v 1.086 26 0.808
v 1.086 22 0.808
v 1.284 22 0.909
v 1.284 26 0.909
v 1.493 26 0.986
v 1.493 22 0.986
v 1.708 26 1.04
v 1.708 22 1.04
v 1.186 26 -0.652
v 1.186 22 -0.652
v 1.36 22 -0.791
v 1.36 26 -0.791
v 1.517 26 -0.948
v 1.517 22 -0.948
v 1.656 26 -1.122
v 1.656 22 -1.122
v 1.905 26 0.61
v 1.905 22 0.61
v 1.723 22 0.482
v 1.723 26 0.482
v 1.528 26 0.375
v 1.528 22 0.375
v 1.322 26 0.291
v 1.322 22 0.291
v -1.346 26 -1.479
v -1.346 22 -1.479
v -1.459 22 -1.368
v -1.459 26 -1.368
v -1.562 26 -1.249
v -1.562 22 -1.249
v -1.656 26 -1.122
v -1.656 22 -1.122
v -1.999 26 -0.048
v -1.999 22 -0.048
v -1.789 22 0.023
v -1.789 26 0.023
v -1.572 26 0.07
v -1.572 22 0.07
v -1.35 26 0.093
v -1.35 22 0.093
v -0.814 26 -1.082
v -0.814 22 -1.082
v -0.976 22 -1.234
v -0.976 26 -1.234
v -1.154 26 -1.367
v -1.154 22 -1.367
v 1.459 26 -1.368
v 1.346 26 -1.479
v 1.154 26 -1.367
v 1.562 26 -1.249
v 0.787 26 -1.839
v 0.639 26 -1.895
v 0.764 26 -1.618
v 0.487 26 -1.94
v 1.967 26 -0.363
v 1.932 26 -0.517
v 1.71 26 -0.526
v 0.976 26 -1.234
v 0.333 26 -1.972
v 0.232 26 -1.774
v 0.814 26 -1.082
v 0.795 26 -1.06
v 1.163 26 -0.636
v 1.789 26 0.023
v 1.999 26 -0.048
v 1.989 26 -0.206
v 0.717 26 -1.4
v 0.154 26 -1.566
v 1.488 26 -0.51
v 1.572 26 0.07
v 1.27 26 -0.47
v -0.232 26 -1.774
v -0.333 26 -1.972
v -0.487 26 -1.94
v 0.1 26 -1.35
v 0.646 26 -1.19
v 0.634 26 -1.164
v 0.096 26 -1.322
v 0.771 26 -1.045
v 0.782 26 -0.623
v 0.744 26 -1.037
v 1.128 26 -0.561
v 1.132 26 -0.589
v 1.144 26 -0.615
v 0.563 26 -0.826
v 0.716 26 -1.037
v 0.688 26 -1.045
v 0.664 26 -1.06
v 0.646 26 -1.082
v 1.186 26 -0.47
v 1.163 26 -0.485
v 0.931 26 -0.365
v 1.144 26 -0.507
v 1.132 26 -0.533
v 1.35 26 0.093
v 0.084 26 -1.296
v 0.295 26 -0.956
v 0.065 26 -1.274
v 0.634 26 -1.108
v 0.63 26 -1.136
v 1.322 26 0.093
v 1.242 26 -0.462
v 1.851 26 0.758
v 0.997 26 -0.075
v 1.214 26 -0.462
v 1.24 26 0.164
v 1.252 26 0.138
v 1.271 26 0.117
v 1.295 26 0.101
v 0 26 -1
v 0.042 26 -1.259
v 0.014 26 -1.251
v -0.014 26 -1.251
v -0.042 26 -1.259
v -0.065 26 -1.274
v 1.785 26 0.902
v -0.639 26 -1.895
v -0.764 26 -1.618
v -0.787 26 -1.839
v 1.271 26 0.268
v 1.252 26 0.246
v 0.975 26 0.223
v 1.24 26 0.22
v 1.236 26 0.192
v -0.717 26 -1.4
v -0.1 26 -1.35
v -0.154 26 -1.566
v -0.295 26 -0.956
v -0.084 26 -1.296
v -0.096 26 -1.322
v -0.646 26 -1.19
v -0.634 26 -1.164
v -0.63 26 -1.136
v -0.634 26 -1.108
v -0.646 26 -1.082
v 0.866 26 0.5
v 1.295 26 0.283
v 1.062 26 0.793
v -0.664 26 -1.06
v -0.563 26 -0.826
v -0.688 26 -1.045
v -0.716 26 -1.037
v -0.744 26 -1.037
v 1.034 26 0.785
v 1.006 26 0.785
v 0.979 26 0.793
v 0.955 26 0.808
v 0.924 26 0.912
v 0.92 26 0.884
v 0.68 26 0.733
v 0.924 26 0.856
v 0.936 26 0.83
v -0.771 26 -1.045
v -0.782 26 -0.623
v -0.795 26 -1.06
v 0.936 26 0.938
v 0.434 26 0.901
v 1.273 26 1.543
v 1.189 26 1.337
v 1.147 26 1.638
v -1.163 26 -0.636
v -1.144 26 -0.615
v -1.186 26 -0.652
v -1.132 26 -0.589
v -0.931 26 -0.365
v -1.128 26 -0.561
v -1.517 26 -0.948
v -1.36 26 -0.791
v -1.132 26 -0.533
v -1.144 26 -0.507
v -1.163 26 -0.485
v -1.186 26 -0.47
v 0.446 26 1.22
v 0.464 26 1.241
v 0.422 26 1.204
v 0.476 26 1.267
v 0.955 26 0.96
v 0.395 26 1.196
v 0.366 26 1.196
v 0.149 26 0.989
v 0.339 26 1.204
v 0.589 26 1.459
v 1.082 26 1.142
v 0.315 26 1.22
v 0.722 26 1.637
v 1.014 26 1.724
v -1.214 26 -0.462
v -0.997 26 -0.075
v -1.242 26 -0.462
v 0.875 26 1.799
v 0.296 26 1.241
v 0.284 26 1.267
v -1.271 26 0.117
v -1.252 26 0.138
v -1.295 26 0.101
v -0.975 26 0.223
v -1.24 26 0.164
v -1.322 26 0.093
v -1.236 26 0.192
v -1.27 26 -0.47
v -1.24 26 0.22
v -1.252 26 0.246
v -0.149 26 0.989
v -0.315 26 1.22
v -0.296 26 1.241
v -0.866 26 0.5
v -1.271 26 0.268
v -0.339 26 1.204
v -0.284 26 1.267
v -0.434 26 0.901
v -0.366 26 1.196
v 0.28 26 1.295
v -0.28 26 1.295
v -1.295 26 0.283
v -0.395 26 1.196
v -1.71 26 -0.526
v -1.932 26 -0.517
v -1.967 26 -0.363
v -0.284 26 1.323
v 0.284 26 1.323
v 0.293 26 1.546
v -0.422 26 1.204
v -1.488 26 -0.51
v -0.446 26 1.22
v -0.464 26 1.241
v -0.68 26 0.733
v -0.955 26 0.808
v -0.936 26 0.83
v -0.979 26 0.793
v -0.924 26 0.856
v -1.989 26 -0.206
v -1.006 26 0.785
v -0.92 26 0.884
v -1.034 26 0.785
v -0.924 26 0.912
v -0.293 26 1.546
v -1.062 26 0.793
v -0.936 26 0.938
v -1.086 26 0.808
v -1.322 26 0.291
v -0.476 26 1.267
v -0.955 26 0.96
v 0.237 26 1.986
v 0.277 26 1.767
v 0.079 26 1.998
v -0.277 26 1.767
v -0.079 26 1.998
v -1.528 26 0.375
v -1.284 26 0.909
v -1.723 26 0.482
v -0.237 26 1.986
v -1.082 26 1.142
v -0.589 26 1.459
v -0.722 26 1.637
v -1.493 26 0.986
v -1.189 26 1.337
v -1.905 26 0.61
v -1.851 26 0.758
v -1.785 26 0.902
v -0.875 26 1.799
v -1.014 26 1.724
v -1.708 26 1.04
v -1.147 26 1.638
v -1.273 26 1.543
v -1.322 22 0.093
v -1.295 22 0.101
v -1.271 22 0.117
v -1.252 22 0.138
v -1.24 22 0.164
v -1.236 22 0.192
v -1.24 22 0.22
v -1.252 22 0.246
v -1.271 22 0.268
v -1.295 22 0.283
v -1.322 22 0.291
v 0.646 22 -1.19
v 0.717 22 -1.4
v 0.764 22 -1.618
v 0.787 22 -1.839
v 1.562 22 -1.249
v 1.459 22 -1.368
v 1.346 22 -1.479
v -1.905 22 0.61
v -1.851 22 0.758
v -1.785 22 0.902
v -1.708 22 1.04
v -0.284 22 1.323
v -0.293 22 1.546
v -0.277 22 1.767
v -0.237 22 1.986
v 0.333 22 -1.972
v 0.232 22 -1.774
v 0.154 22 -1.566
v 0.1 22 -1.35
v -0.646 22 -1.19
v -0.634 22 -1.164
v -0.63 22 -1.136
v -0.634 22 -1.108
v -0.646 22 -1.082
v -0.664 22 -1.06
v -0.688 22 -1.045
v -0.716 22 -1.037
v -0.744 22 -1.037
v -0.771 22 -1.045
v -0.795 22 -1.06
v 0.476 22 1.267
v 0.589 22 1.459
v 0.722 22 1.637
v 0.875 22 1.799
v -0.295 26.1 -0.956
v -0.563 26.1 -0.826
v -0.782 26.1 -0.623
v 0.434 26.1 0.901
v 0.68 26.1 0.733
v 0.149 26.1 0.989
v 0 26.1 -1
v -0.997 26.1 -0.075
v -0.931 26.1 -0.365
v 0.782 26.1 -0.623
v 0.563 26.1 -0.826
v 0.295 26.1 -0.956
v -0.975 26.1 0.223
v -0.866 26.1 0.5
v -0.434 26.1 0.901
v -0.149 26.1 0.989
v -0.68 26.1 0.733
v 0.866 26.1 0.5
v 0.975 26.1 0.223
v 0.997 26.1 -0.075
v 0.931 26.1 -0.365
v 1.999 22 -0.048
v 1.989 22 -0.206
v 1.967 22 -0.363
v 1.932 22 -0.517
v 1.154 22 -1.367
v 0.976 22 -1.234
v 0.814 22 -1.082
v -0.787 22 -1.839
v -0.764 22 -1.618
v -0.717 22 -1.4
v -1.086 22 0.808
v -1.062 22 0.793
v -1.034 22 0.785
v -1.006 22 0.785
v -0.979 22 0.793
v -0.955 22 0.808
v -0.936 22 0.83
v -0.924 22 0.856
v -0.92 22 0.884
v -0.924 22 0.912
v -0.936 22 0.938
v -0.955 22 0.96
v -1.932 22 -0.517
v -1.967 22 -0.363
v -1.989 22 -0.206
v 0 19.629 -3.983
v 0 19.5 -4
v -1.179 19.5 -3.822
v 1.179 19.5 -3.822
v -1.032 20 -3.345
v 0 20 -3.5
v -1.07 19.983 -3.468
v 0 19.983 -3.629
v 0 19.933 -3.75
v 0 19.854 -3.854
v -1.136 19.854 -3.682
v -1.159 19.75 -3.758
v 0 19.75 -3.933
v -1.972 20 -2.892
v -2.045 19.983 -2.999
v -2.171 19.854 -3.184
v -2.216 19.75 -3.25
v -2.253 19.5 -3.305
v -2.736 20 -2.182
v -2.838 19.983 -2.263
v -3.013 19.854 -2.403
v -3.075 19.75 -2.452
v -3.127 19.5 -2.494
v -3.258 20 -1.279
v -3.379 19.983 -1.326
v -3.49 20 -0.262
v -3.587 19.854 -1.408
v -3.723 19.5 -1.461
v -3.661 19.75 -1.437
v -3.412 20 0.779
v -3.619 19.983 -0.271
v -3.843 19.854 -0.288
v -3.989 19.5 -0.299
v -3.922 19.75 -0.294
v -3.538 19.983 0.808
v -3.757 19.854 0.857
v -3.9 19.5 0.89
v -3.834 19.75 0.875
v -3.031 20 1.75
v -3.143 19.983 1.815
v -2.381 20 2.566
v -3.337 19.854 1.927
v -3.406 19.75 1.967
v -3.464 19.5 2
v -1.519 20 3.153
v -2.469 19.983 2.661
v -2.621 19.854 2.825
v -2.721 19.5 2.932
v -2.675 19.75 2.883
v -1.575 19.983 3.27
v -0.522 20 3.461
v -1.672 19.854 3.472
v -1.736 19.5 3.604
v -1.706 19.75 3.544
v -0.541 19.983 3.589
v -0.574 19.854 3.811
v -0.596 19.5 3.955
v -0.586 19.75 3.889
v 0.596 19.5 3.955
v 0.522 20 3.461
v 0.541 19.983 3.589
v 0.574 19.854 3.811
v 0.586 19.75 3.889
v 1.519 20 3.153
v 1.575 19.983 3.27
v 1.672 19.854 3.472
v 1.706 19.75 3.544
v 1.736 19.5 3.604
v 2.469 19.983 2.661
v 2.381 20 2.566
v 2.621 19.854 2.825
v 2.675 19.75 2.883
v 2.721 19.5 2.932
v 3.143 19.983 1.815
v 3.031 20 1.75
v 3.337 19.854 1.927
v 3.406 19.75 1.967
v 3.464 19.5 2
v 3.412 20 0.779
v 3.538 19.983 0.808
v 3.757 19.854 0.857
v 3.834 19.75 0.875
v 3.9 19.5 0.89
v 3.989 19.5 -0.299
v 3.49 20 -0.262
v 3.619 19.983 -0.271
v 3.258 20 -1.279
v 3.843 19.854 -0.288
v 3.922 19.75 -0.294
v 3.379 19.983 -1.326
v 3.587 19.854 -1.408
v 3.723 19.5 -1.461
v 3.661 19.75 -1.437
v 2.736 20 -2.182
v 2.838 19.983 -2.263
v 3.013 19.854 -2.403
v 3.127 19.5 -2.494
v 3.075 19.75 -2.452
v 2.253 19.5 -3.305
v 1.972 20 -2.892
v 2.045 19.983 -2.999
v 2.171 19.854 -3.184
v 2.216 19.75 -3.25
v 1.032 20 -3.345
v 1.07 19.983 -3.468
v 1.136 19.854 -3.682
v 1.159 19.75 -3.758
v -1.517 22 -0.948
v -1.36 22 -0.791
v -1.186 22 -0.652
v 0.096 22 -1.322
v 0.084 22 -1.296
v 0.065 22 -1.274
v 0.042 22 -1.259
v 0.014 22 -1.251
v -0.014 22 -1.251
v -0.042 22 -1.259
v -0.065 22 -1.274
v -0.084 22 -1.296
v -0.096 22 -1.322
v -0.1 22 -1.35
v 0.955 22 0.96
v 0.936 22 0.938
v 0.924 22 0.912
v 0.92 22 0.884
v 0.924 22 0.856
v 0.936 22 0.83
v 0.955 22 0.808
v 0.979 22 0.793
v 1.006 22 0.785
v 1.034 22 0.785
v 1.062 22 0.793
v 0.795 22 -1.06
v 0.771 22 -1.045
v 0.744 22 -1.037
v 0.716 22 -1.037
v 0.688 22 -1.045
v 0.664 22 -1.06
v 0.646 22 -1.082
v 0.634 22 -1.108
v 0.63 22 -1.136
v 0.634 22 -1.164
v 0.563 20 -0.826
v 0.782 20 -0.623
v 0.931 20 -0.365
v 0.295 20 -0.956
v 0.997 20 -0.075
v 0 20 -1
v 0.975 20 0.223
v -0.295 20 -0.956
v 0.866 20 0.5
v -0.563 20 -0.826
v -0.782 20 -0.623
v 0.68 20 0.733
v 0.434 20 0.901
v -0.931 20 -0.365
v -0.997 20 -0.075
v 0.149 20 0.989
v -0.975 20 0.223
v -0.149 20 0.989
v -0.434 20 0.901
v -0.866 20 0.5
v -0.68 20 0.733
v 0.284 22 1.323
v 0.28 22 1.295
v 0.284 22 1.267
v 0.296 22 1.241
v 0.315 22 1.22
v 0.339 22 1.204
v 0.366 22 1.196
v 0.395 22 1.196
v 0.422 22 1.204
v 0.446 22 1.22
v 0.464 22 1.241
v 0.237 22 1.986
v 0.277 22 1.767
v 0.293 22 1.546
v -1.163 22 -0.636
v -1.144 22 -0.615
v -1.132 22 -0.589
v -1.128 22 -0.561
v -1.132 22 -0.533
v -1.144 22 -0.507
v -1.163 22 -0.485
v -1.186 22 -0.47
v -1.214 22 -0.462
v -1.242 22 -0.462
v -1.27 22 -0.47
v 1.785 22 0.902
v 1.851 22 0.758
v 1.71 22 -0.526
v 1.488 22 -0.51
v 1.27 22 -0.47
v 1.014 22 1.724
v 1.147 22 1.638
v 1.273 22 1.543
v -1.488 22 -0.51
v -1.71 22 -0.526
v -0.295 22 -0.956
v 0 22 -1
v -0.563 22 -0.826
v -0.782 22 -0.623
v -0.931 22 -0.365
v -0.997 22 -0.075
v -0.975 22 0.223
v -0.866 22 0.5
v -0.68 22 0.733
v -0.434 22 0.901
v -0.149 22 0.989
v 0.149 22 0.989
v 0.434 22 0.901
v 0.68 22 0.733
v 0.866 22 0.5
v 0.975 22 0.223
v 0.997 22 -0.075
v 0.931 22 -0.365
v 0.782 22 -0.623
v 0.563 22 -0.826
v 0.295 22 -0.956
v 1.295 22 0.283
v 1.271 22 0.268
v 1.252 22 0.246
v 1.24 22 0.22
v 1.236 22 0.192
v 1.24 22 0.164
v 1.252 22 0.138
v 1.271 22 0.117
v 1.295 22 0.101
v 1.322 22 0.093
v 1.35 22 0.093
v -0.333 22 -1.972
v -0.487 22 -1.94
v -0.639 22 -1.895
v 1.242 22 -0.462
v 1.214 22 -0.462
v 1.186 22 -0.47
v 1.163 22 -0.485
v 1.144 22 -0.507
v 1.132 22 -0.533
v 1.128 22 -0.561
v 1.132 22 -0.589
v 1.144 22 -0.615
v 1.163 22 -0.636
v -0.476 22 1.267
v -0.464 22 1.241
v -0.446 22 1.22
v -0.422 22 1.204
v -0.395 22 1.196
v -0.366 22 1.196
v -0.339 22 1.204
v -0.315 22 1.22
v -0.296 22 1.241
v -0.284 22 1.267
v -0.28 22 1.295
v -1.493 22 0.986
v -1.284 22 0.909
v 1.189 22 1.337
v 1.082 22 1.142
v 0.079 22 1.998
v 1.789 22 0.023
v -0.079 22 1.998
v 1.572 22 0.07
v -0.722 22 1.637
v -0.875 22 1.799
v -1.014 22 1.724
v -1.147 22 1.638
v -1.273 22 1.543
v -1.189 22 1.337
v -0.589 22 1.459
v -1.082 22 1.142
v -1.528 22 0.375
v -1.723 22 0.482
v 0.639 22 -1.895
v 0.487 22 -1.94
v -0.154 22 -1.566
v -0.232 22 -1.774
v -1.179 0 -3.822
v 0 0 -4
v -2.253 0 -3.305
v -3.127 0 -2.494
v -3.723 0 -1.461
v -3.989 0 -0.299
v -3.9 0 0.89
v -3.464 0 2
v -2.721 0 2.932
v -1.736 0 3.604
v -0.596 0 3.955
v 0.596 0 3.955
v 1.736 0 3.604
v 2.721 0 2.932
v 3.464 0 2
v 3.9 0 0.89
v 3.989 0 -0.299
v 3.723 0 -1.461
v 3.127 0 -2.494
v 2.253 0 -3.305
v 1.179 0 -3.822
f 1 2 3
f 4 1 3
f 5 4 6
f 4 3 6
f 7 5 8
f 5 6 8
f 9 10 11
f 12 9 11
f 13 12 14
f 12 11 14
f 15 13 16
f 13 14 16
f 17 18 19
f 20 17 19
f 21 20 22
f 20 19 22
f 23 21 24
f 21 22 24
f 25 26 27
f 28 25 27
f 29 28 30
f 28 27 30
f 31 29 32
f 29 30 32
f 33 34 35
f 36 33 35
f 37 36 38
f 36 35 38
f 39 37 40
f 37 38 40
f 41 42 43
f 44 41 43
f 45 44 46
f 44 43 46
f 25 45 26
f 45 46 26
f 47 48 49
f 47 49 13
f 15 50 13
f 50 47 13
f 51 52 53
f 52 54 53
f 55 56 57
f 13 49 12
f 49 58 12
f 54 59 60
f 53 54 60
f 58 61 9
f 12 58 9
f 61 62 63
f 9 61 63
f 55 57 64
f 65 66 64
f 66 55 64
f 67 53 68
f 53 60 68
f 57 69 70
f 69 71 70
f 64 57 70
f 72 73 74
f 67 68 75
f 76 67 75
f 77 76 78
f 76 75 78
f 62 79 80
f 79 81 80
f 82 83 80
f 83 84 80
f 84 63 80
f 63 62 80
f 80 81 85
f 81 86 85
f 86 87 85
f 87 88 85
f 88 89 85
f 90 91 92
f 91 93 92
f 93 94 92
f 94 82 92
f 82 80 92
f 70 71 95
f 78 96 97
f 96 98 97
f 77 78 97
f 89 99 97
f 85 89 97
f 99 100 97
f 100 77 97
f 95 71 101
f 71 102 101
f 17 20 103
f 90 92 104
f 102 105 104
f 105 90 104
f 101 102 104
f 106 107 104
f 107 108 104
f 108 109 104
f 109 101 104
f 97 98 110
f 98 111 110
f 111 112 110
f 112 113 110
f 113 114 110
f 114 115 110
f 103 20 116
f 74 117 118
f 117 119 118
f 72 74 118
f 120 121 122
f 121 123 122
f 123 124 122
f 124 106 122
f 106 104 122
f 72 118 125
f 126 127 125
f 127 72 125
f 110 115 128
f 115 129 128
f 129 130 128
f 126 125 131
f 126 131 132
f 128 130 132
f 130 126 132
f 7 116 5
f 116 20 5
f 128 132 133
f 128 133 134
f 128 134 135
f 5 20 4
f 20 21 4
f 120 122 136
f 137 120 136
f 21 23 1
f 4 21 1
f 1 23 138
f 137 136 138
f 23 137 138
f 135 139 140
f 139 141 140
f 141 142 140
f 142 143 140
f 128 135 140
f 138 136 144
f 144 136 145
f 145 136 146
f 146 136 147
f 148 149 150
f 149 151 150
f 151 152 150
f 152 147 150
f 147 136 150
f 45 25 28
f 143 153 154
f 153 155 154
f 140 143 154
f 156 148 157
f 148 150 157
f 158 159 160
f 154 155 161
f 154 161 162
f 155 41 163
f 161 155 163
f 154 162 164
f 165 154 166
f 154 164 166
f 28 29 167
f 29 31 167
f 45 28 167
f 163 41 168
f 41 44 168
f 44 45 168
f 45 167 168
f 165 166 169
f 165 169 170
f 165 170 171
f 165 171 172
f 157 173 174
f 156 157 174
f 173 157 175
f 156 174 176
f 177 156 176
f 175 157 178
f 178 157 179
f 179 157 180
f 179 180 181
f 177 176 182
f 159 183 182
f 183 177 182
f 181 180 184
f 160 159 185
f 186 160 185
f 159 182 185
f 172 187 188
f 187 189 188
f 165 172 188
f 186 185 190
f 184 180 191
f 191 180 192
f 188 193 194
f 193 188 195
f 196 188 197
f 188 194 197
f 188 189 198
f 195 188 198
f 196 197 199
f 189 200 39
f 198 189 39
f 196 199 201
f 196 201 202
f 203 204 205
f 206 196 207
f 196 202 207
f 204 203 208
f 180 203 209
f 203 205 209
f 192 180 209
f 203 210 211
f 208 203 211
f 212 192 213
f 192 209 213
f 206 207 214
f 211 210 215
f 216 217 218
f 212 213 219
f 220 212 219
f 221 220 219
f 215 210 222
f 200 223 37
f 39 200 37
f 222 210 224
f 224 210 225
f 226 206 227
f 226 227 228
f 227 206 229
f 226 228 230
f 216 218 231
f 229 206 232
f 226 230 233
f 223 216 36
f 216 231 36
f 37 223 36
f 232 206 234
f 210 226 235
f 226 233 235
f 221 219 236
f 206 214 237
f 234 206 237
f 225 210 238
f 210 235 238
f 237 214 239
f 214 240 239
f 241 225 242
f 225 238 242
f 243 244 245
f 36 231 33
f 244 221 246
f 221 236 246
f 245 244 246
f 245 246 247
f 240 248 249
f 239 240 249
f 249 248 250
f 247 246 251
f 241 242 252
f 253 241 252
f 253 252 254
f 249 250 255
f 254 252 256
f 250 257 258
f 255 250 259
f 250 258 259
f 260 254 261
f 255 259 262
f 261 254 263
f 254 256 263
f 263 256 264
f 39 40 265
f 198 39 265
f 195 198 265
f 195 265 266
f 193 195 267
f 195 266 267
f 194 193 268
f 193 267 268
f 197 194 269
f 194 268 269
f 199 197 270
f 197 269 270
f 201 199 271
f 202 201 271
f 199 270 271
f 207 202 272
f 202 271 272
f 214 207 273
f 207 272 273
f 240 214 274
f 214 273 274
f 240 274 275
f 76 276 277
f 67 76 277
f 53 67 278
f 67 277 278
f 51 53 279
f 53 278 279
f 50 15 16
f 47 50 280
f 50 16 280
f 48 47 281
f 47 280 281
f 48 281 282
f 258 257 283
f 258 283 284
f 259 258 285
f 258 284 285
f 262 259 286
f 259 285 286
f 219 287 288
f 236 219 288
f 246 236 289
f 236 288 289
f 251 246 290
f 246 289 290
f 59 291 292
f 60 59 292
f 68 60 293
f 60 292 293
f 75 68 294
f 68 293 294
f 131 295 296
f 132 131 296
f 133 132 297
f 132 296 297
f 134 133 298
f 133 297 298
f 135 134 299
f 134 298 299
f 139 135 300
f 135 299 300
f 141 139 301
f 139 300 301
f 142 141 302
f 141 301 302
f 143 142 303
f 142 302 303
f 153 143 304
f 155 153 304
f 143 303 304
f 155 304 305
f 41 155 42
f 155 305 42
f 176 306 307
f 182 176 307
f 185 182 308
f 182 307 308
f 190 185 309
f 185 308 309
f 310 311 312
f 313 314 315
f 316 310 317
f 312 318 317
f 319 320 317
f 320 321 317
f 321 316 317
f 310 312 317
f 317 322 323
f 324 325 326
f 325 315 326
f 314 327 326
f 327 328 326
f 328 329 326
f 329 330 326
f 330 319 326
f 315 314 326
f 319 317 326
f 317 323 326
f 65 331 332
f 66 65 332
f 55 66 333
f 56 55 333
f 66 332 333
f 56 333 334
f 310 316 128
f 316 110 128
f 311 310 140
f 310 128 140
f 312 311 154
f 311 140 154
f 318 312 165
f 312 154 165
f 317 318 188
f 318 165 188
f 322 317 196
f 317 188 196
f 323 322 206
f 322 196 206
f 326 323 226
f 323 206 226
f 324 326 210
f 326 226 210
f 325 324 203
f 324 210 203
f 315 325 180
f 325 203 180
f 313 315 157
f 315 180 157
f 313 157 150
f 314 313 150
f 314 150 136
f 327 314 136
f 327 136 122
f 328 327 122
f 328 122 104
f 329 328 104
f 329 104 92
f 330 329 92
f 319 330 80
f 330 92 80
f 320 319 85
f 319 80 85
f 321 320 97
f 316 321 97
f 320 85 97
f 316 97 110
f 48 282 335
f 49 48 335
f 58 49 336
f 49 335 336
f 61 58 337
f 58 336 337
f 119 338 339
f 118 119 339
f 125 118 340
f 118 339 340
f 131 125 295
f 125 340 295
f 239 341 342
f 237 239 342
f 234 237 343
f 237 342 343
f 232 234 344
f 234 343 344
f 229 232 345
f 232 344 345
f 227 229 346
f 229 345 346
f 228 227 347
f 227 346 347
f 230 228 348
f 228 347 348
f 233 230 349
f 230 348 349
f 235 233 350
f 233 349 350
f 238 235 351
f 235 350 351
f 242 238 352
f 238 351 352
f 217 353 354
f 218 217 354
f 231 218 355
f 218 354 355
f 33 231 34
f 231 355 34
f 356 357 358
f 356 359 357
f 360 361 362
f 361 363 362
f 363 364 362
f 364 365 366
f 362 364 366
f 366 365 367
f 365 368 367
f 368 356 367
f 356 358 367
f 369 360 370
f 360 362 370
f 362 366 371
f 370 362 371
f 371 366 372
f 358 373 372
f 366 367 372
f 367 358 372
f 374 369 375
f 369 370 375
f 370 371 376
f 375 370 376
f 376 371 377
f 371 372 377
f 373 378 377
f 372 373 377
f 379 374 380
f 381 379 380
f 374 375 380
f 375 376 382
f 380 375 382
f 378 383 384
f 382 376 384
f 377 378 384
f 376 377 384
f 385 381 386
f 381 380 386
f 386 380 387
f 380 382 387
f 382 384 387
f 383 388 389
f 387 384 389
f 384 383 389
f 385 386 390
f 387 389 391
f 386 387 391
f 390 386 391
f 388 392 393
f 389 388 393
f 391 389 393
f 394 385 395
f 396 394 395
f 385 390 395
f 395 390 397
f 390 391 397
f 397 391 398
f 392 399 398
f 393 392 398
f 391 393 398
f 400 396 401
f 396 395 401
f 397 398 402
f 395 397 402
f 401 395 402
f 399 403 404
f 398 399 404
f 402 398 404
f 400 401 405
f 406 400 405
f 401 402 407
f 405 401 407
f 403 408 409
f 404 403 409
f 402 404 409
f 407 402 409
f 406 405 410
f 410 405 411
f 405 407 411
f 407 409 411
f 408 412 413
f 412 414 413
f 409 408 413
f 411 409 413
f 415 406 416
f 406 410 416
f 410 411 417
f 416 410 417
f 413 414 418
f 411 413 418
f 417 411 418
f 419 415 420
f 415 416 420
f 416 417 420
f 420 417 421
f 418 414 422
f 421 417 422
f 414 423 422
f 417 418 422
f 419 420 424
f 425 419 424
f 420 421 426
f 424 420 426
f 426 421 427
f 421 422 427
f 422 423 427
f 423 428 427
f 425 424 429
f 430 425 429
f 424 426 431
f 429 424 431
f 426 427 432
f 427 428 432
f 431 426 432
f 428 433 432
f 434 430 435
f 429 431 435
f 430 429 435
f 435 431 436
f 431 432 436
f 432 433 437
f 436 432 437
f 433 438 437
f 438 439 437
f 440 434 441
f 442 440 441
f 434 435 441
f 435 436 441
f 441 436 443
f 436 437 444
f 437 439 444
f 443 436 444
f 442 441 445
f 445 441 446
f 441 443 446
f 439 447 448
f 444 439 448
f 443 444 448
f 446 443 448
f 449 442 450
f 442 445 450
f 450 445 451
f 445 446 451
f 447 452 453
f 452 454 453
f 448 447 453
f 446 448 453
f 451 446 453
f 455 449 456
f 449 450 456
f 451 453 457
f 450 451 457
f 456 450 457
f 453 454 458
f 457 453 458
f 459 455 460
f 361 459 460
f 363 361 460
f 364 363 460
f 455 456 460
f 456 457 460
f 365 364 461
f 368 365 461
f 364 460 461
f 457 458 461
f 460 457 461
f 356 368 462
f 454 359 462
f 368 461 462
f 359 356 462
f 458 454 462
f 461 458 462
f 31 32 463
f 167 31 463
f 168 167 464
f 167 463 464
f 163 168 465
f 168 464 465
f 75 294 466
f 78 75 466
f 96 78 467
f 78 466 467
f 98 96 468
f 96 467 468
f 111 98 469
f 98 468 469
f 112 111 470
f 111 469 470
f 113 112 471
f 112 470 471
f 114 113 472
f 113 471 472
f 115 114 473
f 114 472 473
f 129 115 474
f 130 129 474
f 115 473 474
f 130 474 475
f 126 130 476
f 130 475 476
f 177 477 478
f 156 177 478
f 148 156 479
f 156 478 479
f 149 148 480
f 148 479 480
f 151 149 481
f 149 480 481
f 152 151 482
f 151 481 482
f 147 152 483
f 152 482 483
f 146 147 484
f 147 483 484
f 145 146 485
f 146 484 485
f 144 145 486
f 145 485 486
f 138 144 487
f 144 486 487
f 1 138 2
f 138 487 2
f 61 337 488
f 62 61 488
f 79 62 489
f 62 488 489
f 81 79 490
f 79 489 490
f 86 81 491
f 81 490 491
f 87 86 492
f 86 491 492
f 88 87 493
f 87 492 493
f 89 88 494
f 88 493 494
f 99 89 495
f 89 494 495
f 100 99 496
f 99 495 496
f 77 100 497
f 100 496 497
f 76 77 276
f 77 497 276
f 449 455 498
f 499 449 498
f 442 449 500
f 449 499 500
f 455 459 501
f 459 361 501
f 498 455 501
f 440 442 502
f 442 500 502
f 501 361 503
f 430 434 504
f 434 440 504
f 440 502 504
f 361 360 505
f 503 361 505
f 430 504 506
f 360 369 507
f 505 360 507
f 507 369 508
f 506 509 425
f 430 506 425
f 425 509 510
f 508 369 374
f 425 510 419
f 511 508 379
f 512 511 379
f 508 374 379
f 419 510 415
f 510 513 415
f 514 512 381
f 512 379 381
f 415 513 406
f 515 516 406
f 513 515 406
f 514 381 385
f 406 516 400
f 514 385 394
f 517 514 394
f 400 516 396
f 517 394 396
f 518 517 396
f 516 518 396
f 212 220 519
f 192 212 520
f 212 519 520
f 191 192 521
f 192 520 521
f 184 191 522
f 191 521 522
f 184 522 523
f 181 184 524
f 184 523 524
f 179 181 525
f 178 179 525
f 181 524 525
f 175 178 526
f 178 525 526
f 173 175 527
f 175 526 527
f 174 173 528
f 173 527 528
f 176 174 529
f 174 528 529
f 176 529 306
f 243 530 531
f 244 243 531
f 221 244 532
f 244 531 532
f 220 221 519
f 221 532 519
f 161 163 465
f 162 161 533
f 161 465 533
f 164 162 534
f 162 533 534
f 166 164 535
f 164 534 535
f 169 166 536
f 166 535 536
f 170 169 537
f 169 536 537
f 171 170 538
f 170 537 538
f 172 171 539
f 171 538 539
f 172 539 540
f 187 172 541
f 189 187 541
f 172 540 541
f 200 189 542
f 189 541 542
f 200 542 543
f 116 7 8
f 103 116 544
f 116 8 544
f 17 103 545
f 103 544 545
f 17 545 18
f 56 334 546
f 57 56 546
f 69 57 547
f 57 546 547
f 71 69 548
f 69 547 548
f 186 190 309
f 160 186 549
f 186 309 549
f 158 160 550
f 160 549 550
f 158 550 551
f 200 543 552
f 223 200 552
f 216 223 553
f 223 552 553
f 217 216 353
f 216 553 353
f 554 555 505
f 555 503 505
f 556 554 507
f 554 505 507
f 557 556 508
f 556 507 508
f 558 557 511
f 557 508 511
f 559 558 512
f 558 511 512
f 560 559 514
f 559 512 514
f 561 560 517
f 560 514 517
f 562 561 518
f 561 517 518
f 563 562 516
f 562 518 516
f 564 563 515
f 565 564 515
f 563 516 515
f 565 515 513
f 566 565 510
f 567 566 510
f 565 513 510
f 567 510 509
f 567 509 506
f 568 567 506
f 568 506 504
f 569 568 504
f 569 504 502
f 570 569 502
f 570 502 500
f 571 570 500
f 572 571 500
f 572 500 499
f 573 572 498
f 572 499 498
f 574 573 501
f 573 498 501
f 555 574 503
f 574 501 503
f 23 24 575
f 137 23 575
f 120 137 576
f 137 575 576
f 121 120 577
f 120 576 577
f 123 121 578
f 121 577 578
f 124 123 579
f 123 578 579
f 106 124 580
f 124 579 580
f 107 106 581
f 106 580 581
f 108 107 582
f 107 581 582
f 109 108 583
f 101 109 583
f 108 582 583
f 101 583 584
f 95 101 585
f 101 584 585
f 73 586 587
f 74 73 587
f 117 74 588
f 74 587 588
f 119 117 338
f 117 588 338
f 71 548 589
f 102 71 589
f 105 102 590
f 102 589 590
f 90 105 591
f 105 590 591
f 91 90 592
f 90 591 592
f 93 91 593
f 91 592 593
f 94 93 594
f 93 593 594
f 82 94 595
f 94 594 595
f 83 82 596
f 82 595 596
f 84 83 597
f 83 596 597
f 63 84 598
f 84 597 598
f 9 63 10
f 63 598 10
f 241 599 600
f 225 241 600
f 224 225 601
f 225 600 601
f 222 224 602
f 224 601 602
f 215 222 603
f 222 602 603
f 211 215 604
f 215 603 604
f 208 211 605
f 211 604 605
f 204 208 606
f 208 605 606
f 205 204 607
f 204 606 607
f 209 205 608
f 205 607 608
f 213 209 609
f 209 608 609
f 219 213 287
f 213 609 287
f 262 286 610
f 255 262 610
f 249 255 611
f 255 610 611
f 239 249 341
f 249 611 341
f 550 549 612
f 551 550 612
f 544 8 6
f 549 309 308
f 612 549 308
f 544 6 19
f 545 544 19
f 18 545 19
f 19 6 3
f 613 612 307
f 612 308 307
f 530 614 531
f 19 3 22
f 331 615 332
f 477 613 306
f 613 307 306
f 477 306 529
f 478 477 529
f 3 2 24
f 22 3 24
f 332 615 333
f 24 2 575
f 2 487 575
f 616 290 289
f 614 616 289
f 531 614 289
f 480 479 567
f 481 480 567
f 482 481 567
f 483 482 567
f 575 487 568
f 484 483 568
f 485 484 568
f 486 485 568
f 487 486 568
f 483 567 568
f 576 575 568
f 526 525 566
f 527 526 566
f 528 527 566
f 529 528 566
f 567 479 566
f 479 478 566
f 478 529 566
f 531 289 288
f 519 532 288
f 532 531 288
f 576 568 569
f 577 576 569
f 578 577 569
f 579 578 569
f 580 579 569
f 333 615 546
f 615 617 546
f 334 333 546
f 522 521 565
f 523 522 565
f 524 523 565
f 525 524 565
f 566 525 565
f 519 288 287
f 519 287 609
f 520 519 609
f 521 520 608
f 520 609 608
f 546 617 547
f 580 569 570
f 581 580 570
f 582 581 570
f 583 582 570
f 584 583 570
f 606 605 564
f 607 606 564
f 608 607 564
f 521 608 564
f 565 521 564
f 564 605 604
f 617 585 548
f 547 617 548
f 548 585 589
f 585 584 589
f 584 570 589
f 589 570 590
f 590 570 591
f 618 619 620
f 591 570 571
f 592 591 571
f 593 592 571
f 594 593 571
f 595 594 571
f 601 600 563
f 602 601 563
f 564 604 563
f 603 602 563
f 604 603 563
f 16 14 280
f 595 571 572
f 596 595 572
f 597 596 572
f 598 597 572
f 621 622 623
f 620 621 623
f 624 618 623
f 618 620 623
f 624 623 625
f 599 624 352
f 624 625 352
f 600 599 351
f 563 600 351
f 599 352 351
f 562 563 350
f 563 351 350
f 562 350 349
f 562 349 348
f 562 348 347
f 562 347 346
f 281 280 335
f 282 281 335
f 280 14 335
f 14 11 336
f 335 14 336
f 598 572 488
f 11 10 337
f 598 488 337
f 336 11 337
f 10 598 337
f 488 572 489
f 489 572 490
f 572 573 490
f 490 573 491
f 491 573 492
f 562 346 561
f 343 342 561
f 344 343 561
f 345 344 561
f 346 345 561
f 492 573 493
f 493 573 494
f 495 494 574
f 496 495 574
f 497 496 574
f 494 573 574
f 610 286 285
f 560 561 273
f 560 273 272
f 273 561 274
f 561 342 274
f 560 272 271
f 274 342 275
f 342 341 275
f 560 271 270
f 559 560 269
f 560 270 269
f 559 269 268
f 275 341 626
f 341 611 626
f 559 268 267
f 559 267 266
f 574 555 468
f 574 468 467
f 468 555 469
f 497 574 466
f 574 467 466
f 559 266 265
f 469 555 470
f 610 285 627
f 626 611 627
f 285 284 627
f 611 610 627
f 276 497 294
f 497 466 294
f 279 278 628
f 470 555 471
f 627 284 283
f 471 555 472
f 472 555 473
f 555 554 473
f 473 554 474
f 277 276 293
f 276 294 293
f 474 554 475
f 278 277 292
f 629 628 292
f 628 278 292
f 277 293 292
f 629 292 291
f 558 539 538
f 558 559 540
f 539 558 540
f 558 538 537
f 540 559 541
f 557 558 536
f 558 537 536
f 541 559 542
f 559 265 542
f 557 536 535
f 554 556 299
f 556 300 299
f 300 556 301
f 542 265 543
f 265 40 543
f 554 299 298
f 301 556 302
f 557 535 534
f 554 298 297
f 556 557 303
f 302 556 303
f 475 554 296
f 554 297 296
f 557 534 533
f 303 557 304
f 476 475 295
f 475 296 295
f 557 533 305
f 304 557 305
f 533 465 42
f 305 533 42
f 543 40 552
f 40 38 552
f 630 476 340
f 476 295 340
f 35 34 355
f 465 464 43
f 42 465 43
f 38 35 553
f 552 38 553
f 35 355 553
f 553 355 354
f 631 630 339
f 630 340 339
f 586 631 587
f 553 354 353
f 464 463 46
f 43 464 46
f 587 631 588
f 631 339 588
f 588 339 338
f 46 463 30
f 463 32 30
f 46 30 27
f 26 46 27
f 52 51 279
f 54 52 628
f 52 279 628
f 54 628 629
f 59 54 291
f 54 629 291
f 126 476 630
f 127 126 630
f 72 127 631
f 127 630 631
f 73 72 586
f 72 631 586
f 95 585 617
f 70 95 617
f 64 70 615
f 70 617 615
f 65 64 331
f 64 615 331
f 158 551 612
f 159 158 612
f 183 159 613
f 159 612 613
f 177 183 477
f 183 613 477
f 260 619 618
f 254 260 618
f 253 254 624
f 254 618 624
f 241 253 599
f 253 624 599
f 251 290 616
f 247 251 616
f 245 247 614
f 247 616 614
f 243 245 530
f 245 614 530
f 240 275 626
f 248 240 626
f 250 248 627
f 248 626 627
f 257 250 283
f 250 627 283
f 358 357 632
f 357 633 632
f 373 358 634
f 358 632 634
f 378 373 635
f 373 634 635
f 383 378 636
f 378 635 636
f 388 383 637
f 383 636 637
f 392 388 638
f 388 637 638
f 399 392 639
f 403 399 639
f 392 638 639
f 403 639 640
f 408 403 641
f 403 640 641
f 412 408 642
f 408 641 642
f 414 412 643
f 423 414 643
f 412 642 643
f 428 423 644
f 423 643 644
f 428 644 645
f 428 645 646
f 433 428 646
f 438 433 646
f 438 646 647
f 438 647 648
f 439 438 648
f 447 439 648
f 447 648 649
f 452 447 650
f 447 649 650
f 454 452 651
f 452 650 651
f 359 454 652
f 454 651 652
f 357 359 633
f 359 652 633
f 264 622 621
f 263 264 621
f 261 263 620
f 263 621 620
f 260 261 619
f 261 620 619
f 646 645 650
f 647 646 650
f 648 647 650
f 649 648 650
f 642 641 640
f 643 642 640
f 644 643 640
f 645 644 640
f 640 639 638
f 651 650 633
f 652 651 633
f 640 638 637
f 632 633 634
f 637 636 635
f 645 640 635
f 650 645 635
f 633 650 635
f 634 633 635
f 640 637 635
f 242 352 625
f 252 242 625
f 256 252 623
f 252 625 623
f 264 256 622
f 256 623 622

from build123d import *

# Parameters (mm, degrees)
CUT_EXTRUDE2_START = -5
CUT_EXTRUDE2_DEPTH = 5
CIRPATTERN1_COUNT  = 11


with BuildPart() as part:
    # Sketch4 → Revolve1 (revolve)
    with BuildSketch(Plane(origin=(0, 0, 0), x_dir=(0, 0, -1), z_dir=(1, 0, 0))):
        with BuildLine():
            Line((0, 0), (0, 26.1))
            Line((0, 26.1), (1, 26.1))
            Line((1, 26.1), (1, 26))
            Line((1, 26), (2, 26))
            Line((2, 26), (2, 22))
            Line((2, 22), (1, 22))
            Line((1, 22), (1, 20))
            Line((1, 20), (3.5, 20))
            ThreePointArc((3.5, 20), (3.853553391, 19.853553391), (4, 19.5))
            Line((4, 19.5), (4, 0))
            Line((4, 0), (0, 0))
        make_face()
    revolve(axis=Axis((0, 0, 0), (0, 1, 0)))

    # Sketch5 → Cut-Extrude2 (cut)
    with BuildSketch(Plane(origin=(0, 26, 0), x_dir=(1, 0, 0), z_dir=(0, 1, 0)).offset(CUT_EXTRUDE2_START)):
        with BuildLine():
            ThreePointArc((0.332507409, 1.972166023), (0.190245846, 1.670802314), (0.1, 1.35))
            ThreePointArc((0.1, 1.35), (0, 1.25), (-0.1, 1.35))
            ThreePointArc((-0.1, 1.35), (-0.190245846, 1.670802314), (-0.332507409, 1.972166023))
            ThreePointArc((-0.332507409, 1.972166023), (0, 2), (0.332507409, 1.972166023))
        make_face()
    cut_extrude2 = extrude(amount=CUT_EXTRUDE2_DEPTH, mode=Mode.SUBTRACT)

    # CirPattern1: Cut-Extrude2 ×11 about axis
    cirpattern1_axis = Axis((0, 0, 0), (0, 1, 0))
    for i in range(1, CIRPATTERN1_COUNT):
        add(cut_extrude2.rotate(cirpattern1_axis, i * 360 / CIRPATTERN1_COUNT), mode=Mode.SUBTRACT)


solid = part.part
